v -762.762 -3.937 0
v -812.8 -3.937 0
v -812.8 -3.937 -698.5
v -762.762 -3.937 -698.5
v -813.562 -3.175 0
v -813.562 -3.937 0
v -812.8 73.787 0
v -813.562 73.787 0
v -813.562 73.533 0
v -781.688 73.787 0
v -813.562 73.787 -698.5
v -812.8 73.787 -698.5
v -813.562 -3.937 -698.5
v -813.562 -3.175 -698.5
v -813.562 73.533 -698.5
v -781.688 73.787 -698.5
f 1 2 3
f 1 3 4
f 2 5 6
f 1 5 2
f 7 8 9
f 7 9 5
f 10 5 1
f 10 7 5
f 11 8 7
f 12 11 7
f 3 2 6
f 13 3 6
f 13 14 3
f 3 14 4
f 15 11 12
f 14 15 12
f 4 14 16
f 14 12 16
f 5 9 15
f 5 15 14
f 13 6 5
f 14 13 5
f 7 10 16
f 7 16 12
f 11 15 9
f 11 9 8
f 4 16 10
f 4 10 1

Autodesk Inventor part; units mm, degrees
ref_plane "YZ Plane" through (0, 0, 0) normal (1, 0, 0) x (0, 1, 0)
ref_plane "XZ Plane" through (0, 0, 0) normal (0, 1, 0) x (-1, 0, 0)
sketch "Sketch1" plane through (0, 0, 0) normal (0, 0, 1) x (1, 0, 0)
  line L0 (-812.8, -3.937) -> (0, -3.937) projected
  line L1 (0, 73.787) -> (-812.8, 73.787) projected
  line L2 (-813.562, 73.533) -> (-813.562, -3.175) projected
  line L3 (-762.762, -3.937) -> (-762.762, -7.112) projected
  line L4 (-781.812, 77.47) -> (-781.812, 74.295) projected
  line L5 (-762.762, -3.937) -> (-813.562, -3.937)
  line L6 (-813.562, -3.937) -> (-813.562, 73.787)
  line L7 (-813.562, 73.787) -> (-781.6883, 73.787)
  line L8 (-781.6883, 73.787) -> (-762.762, -3.937)
  point P0 (0, 0)
ref_plane "Work Plane1" through (-812.8, 0, -698.5) normal (0, 0, -1) x (0, 1, 0)
extrude "Extrusion1" add sketch "Sketch1" against normal up to surface (698.5 mm away)
properties part number "RearBumperFill"
